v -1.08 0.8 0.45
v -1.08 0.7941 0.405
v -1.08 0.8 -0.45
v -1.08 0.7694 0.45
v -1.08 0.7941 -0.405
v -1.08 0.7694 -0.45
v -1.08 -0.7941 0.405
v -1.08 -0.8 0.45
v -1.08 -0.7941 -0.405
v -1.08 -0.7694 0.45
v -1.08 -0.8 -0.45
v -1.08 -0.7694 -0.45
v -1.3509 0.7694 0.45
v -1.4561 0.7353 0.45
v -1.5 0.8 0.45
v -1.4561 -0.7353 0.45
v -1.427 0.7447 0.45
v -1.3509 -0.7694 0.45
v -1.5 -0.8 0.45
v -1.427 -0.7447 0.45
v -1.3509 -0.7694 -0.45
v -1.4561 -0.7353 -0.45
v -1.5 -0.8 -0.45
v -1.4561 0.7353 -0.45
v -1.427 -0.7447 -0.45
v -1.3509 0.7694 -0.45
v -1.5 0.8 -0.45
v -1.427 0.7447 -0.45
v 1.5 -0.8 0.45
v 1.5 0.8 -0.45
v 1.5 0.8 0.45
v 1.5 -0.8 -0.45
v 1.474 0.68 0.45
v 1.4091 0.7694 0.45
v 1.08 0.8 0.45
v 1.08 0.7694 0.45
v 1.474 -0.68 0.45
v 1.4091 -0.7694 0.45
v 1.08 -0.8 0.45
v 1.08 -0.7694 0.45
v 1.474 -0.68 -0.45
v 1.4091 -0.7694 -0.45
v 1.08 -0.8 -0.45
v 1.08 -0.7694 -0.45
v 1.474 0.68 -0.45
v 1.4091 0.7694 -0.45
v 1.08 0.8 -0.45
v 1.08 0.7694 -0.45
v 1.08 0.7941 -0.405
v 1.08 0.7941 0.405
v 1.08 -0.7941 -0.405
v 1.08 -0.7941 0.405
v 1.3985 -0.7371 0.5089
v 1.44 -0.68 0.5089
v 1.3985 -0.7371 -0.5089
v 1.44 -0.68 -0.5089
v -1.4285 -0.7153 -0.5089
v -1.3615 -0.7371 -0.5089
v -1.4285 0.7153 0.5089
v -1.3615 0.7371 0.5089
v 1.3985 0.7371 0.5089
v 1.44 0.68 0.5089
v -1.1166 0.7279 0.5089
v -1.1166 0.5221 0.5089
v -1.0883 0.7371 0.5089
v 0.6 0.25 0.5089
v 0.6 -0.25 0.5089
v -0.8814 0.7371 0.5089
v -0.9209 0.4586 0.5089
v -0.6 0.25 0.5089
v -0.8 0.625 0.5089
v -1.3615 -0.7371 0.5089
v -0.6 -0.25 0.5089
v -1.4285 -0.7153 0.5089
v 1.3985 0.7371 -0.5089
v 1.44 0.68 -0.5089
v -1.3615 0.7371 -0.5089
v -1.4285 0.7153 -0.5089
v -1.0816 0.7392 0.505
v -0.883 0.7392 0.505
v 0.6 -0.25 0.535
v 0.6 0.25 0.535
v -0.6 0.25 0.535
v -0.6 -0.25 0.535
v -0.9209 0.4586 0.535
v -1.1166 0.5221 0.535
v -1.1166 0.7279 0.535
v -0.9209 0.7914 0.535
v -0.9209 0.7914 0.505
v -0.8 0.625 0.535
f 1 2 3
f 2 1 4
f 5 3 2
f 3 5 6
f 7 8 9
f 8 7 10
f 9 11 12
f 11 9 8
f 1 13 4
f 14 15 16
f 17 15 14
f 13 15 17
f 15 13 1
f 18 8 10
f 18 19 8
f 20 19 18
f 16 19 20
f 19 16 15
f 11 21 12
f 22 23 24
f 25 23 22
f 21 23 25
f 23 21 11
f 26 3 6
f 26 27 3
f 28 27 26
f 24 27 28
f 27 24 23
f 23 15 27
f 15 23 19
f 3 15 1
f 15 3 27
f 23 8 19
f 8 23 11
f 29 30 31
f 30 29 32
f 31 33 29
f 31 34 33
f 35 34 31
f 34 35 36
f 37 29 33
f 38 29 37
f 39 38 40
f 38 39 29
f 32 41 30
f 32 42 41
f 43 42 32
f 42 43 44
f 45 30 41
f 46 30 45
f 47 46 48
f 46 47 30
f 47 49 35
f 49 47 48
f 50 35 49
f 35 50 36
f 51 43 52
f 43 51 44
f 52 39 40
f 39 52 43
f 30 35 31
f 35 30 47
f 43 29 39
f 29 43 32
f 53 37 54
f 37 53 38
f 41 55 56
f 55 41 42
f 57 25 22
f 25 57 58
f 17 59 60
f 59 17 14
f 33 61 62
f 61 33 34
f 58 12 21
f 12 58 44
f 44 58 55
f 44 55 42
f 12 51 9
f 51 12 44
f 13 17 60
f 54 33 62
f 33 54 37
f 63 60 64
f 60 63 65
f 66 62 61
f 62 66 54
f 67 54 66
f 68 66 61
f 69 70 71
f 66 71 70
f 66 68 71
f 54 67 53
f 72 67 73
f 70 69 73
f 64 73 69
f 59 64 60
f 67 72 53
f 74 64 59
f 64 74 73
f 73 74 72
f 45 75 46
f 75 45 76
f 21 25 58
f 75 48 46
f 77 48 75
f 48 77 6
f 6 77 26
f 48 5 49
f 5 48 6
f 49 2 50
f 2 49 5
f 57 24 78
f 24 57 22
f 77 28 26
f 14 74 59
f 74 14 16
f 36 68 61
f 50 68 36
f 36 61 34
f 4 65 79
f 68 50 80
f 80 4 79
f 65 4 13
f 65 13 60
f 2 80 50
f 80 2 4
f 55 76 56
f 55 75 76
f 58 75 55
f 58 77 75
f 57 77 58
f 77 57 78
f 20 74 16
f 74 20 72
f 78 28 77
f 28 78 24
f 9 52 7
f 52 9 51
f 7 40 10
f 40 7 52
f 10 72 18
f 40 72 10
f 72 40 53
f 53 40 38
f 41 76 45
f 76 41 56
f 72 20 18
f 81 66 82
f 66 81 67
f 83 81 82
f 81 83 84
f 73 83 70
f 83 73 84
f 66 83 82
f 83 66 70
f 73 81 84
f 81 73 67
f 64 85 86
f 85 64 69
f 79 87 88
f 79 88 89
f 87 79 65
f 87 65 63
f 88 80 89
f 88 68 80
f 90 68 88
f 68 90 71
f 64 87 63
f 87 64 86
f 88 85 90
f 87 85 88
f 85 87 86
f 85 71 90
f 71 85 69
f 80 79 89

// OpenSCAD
// Parameters
body_length = 3.0; //[1.5:6.0:0.05]
body_width = 1.6; //[0.8:3.2:0.05]
body_height = 1.05; //[0.5:2.1:0.05]
endcap_length = 0.35; //[0.15:0.8:0.01]
endcap_thickness = 0.05; //[0.02:0.15:0.01]
endcap_height = 0.9; //[0.4:1.5:0.05]
marking_thickness = 0.03; //[0.01:0.1:0.01]
marking_length = 1.2; //[0.4:2.4:0.05]
marking_width = 0.5; //[0.2:1.2:0.05]
fillet_radius = 0.12; //[0.05:0.3:0.01]
polarity_diameter = 0.35; //[0.15:0.7:0.01]
polarity_height = 0.03; //[0.01:0.1:0.01]
overlap = 0.02; //[0.01:0.2:0.01]

// Base shapes
module smd_body_core() {
  cube([body_length - 2*fillet_radius, body_width - 2*fillet_radius, body_height - 2*fillet_radius], center=true);
}

module body_edge_fillet_sphere() {
  sphere(r=fillet_radius);
}

module endcap_left() {
  translate([-(body_length/2) + (endcap_length + endcap_thickness + overlap)/2, 0, 0])
    cube([endcap_length + endcap_thickness + overlap, body_width, endcap_height], center=true);
}

module endcap_right() {
  translate([(body_length/2) - (endcap_length + endcap_thickness + overlap)/2, 0, 0])
    cube([endcap_length + endcap_thickness + overlap, body_width, endcap_height], center=true);
}

module top_marking() {
  translate([0, 0, body_height/2 + marking_thickness/2 - overlap])
    cube([marking_length, marking_width, marking_thickness], center=true);
}

module polarity_indicator() {
  translate([-(body_length/2) + endcap_length + polarity_diameter/2, (body_width/2) - polarity_diameter/2, body_height/2 + polarity_height/2 - overlap])
    cylinder(h=polarity_height, r=polarity_diameter/2, center=true);
}

// Operations
module smd_body() {
  minkowski() {
    smd_body_core();
    body_edge_fillet_sphere();
  }
}

module terminal_endcaps() {
  union() {
    endcap_left();
    endcap_right();
  }
}

module smd_complete_model() {
  union() {
    smd_body();
    terminal_endcaps();
    top_marking();
    polarity_indicator();
  }
}

// Final output
smd_complete_model();
